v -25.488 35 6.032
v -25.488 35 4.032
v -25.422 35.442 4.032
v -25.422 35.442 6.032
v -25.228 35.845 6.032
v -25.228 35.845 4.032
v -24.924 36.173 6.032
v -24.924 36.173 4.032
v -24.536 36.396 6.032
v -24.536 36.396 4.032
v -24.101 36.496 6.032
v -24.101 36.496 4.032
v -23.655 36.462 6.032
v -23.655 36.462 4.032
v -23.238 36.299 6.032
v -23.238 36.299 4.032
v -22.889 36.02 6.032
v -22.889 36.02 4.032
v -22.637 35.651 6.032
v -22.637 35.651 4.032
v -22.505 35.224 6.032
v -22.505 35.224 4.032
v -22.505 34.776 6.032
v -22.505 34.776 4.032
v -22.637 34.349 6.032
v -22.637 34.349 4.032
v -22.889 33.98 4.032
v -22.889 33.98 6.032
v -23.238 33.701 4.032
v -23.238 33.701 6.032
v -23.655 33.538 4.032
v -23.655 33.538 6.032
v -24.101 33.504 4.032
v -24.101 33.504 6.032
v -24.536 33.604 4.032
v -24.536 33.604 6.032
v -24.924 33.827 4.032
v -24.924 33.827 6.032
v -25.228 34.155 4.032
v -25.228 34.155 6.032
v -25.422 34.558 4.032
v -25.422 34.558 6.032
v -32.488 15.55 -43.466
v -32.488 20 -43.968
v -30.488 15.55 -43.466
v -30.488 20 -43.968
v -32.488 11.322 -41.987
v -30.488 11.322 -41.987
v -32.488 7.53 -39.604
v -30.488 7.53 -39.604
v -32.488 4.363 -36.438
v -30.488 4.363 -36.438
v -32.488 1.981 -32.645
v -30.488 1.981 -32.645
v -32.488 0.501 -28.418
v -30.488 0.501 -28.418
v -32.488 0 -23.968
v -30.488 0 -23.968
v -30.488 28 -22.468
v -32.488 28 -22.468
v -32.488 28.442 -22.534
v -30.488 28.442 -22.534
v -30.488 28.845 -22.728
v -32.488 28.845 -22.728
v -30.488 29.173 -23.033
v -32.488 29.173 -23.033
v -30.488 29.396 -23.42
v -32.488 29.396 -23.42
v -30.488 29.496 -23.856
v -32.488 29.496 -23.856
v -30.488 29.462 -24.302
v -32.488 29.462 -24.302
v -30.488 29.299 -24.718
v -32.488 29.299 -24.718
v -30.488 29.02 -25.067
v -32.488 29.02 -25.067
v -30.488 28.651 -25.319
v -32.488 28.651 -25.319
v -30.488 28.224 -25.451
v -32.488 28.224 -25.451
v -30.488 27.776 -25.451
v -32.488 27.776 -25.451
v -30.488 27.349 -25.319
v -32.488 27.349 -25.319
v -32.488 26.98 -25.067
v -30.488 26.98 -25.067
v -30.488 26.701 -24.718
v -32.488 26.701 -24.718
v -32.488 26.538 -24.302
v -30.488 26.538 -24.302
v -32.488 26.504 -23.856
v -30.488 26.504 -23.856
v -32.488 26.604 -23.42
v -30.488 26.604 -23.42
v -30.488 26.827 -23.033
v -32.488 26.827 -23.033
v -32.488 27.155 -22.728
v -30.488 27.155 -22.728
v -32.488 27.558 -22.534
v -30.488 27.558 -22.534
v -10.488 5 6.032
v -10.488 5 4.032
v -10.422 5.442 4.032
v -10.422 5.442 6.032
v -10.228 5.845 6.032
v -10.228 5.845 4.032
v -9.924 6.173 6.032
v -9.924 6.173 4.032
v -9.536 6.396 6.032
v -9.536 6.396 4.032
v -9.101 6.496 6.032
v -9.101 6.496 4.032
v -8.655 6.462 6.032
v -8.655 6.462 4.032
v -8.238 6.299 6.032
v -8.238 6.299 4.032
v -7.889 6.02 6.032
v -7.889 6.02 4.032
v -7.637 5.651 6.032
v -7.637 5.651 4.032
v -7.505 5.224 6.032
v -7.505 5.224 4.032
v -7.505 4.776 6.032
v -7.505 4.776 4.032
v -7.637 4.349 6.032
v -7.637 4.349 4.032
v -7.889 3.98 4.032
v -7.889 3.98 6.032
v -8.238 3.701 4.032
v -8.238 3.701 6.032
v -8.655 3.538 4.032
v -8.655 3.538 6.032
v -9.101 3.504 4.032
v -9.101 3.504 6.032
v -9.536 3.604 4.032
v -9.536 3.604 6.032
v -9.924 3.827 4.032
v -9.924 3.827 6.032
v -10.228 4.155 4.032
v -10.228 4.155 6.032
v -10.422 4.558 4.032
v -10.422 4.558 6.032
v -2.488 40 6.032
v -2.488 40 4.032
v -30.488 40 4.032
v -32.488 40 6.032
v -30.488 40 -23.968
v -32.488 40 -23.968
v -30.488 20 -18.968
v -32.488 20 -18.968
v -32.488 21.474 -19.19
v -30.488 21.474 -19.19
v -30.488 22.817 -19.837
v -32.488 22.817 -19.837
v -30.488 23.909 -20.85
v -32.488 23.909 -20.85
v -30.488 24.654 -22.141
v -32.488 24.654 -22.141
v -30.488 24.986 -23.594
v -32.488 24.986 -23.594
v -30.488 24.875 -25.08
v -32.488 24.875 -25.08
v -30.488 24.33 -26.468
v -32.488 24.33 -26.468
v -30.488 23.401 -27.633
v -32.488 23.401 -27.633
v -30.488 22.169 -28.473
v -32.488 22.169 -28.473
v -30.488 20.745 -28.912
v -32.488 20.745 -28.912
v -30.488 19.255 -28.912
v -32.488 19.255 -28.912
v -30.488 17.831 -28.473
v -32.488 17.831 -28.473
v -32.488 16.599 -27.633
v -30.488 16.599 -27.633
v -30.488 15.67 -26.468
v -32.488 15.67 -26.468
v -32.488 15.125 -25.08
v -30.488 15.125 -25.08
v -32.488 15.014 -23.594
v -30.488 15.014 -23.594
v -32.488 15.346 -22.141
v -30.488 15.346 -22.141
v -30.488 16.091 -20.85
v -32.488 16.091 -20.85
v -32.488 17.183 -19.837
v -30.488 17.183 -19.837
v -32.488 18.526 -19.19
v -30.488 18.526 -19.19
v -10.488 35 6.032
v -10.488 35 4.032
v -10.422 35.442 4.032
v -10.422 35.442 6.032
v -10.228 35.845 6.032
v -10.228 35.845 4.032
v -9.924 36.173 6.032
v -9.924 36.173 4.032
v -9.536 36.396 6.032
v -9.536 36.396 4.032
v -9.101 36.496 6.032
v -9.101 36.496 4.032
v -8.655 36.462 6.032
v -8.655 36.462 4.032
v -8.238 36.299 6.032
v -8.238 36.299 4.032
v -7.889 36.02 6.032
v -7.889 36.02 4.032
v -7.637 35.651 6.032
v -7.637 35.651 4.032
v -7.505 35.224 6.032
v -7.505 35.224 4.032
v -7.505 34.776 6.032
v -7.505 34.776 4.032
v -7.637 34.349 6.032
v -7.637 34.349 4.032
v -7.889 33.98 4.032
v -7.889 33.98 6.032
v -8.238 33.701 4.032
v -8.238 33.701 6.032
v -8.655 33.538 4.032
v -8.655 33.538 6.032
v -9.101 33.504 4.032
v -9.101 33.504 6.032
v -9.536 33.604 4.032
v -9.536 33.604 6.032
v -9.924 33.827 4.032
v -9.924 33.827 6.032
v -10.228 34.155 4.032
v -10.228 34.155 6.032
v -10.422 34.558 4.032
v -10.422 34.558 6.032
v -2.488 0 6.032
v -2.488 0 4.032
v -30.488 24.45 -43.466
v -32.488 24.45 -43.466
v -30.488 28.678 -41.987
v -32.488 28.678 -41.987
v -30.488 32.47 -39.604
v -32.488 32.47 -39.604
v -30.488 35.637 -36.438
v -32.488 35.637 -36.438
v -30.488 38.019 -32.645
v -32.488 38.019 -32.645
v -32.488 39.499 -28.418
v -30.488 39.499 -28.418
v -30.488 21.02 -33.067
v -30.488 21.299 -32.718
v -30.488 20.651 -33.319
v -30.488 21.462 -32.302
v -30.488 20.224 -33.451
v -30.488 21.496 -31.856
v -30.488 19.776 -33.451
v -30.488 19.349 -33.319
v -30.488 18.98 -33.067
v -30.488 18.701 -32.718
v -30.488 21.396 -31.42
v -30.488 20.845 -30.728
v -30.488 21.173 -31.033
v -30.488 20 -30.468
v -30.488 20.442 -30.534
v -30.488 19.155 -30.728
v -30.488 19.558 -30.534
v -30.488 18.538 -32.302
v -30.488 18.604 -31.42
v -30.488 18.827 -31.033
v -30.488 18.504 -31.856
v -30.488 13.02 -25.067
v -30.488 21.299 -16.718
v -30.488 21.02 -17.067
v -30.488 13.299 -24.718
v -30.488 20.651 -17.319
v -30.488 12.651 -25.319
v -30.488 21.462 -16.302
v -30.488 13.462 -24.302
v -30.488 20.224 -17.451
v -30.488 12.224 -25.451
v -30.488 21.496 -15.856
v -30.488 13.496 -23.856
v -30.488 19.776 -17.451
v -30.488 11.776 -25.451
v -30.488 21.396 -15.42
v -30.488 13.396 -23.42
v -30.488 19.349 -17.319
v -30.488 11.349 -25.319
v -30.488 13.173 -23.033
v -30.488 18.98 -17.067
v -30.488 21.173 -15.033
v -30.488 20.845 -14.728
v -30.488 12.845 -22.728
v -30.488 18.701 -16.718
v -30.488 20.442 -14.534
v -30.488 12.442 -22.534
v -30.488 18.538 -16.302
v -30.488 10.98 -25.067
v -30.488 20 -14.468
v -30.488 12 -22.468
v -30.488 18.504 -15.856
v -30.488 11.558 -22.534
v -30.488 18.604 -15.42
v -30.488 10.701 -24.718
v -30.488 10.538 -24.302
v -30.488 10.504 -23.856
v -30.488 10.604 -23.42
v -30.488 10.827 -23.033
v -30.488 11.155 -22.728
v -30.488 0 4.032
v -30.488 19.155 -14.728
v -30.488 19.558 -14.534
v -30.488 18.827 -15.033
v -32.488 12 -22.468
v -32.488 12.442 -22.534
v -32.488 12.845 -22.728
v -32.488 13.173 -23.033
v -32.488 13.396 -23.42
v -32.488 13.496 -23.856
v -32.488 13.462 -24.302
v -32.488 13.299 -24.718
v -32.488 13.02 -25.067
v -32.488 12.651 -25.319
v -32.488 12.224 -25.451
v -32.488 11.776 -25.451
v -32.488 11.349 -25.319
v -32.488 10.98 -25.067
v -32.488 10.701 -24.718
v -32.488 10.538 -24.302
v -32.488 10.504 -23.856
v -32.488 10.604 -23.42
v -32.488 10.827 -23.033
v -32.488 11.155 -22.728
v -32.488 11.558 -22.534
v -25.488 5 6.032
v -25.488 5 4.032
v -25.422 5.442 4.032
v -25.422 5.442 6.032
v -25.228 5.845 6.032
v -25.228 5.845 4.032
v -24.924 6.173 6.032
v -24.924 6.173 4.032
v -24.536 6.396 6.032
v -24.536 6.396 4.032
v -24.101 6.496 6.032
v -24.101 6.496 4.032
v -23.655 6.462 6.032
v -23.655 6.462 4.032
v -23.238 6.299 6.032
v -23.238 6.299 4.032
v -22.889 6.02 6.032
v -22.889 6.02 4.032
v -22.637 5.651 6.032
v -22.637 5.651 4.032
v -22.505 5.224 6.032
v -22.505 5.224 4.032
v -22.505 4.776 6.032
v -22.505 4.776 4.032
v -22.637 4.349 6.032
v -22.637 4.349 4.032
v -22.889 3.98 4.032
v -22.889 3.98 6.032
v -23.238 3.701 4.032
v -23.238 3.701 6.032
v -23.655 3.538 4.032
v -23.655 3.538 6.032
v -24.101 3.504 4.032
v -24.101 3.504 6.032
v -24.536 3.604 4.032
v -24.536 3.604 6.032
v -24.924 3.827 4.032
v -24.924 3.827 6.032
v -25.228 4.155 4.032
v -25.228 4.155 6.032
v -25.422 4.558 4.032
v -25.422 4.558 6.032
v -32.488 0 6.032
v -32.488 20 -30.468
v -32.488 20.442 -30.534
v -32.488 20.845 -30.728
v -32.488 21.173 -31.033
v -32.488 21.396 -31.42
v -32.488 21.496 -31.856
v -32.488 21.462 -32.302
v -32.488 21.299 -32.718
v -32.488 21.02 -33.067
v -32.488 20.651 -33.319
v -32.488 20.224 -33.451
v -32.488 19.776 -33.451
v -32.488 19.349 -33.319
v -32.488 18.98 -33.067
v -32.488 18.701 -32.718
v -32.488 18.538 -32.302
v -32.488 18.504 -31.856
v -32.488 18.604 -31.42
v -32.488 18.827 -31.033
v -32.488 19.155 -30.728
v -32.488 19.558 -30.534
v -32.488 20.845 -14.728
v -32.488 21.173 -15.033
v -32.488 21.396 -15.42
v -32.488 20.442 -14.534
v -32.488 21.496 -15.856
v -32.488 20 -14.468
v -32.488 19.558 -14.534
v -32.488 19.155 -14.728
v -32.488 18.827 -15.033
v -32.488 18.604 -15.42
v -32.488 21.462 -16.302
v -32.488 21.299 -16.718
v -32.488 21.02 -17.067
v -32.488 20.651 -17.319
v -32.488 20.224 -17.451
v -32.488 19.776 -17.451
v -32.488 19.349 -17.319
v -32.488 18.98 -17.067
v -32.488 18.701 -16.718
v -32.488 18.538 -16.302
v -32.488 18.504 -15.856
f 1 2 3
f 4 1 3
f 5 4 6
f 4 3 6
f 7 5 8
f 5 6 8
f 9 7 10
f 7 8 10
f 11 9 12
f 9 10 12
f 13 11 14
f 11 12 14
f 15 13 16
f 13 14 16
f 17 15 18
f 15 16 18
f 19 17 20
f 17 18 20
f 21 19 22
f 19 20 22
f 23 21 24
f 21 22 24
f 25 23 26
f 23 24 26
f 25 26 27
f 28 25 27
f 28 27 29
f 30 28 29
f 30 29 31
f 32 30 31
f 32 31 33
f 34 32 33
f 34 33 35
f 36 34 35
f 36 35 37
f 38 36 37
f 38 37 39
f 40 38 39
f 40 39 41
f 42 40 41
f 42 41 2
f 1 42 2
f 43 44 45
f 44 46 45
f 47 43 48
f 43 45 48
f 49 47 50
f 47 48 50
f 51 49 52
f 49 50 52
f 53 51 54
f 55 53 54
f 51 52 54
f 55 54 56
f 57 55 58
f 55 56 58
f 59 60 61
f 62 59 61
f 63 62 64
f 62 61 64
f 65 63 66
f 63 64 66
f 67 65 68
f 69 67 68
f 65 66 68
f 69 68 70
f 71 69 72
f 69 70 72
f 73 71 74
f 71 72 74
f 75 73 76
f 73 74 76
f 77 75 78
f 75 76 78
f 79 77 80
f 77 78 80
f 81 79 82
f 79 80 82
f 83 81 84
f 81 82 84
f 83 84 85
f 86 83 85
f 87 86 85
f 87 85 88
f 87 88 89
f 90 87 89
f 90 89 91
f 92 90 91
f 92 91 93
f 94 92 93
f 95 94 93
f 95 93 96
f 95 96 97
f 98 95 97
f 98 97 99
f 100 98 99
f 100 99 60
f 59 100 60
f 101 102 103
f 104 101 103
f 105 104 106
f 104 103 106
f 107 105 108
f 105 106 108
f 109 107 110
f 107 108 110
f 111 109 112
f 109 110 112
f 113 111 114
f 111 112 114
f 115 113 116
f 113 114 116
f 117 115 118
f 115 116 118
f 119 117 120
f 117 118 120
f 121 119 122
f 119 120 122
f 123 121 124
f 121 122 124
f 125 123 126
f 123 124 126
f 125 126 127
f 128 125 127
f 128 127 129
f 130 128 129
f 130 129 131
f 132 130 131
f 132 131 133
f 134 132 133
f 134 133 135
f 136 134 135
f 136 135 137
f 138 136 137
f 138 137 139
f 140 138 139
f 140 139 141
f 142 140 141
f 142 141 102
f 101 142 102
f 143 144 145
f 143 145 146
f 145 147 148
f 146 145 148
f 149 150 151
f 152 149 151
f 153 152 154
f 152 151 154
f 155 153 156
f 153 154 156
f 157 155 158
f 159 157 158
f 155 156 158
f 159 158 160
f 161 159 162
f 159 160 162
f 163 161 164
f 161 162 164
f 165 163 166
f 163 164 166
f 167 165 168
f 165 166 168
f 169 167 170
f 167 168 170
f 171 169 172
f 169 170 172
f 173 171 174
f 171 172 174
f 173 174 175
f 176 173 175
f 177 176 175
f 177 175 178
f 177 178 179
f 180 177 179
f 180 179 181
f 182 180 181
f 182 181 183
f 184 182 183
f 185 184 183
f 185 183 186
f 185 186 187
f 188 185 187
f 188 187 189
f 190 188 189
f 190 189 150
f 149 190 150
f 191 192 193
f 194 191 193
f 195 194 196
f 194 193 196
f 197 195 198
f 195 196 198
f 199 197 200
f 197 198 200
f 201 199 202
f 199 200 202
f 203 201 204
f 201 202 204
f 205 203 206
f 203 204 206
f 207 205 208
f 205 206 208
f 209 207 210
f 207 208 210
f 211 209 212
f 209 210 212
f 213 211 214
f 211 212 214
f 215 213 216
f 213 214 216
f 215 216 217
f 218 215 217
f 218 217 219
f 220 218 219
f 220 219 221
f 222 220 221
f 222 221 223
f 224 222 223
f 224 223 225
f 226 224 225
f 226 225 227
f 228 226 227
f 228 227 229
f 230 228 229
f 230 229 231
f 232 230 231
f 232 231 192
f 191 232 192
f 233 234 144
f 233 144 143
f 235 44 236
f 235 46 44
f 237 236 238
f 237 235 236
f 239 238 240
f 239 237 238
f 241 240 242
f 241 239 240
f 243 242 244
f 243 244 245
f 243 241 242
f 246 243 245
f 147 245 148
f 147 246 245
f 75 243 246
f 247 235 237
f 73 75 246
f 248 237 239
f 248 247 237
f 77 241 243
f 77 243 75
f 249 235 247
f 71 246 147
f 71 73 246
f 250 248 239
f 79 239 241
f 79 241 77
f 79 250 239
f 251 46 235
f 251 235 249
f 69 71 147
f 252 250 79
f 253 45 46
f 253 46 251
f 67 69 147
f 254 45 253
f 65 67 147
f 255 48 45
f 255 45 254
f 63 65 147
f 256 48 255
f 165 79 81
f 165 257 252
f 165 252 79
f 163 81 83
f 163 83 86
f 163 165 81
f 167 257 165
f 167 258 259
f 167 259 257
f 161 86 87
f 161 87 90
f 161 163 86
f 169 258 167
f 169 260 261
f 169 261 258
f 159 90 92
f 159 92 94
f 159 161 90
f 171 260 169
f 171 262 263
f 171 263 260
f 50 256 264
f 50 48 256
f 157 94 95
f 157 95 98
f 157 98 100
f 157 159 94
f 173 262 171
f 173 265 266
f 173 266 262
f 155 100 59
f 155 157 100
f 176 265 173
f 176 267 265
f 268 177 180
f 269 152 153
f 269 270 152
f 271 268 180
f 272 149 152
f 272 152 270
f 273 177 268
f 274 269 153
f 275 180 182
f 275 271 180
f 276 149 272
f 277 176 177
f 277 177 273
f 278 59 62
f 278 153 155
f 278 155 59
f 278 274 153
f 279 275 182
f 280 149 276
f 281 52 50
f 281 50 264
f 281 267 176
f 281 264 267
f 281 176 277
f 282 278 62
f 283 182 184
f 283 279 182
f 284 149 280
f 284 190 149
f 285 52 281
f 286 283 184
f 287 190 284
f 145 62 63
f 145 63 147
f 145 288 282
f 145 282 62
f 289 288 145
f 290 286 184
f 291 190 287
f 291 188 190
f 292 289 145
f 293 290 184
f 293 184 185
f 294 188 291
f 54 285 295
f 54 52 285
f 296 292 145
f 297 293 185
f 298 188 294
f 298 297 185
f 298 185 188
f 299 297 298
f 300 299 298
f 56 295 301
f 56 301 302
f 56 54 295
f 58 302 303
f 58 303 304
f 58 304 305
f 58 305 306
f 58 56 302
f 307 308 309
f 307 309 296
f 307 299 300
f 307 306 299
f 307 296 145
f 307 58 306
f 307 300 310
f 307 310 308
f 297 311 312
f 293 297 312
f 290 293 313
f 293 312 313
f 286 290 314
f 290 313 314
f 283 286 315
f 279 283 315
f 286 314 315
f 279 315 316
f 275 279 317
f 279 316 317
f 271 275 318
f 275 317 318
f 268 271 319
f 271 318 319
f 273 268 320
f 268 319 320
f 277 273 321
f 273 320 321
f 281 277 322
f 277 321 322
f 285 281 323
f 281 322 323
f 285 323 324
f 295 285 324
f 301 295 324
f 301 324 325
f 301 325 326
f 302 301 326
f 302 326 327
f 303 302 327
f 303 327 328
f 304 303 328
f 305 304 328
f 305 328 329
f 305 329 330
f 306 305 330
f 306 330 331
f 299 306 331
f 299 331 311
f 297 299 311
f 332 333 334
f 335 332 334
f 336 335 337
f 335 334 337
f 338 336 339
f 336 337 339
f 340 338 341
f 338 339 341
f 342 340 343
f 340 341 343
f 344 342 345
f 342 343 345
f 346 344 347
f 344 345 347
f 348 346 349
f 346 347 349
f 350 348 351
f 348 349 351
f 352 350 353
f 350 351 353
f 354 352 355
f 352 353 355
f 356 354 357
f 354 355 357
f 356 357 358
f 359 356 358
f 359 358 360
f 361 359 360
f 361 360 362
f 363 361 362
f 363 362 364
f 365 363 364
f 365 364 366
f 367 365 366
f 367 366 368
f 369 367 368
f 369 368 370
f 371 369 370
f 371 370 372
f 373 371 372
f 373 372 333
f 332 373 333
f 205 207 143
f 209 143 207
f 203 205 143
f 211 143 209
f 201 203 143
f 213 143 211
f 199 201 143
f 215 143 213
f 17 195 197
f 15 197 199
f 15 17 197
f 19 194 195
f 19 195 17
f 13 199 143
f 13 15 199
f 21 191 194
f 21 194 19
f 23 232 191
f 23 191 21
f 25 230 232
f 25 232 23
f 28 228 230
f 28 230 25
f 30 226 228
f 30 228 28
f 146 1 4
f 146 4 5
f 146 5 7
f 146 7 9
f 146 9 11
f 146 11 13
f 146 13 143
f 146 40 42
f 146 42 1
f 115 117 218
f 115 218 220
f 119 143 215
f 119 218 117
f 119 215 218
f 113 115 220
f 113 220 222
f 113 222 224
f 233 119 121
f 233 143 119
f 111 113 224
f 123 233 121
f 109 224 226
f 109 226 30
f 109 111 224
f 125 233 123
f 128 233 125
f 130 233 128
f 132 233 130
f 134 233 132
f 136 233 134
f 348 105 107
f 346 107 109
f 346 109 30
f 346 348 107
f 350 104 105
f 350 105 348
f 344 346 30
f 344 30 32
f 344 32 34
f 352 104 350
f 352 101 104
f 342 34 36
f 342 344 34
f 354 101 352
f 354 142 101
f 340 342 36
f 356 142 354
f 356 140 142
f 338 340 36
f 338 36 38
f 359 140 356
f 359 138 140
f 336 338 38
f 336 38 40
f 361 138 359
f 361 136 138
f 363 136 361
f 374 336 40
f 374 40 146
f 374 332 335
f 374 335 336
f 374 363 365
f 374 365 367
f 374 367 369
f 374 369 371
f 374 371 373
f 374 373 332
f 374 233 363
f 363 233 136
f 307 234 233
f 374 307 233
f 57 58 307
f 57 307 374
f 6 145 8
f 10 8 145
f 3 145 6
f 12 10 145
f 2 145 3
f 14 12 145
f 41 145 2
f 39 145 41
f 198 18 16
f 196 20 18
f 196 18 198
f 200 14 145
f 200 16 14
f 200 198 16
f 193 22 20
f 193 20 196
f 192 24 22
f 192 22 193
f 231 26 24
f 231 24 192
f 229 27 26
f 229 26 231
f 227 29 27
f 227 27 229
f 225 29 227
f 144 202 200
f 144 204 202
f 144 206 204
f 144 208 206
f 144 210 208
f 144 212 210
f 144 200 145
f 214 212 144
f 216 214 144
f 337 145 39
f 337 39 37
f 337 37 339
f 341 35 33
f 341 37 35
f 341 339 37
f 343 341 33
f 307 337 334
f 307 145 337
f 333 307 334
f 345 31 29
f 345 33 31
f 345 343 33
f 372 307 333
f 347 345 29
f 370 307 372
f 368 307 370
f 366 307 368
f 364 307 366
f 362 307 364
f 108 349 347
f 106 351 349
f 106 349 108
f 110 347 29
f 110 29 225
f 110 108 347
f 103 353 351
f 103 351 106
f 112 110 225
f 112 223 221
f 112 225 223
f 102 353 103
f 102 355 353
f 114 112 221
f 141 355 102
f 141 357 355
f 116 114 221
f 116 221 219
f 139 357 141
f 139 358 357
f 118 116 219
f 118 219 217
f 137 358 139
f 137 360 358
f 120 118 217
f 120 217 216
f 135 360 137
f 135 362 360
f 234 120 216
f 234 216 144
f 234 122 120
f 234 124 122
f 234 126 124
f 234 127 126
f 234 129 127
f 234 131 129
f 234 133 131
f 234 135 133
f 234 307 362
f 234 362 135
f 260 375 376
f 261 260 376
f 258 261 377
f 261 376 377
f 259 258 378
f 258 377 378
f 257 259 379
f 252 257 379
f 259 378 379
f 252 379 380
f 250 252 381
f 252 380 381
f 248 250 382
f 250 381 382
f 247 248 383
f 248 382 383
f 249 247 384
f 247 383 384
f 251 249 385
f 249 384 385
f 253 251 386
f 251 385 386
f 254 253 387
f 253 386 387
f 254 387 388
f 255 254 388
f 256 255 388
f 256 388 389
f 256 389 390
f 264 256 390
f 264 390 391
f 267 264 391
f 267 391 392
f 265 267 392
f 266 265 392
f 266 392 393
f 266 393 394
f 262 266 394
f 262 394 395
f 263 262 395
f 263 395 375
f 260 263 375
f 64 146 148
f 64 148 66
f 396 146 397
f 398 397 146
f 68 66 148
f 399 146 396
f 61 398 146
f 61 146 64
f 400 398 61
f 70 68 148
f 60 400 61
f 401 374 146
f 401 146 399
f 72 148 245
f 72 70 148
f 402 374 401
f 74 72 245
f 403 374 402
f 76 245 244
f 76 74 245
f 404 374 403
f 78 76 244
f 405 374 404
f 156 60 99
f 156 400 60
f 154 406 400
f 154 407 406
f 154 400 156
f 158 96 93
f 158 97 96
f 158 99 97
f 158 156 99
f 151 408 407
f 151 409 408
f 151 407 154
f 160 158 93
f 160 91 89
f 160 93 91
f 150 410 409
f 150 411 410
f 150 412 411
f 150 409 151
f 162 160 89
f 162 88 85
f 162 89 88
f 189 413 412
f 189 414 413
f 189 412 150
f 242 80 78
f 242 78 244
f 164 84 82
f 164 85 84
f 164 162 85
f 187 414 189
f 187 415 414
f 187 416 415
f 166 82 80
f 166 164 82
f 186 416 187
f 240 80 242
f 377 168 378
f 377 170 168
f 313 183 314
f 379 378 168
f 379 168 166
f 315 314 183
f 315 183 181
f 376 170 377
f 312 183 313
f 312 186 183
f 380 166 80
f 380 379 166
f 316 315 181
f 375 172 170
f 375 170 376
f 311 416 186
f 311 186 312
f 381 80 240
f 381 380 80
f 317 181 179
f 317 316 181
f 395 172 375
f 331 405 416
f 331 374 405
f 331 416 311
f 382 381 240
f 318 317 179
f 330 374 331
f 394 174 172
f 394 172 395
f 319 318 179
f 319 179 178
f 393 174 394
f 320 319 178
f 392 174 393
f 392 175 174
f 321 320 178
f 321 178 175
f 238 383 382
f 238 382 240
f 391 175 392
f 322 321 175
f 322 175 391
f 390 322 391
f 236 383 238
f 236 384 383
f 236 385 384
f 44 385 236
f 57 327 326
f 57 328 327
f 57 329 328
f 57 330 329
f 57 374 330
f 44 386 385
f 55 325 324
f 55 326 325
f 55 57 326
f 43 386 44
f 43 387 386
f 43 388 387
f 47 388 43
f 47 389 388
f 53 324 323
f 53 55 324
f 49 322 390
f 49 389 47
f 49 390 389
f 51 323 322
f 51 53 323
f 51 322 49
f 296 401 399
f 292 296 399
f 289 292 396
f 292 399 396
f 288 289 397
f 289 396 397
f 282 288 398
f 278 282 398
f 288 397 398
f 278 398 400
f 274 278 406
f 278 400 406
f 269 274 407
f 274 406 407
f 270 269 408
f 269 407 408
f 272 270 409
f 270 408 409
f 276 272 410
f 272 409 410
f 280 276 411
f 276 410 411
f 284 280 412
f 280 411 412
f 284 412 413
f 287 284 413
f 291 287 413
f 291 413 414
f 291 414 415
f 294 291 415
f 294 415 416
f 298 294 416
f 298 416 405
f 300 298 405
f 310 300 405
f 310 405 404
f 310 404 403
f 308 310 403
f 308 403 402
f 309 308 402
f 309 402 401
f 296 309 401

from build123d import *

# Parameters (mm, degrees)
EXTRUDE_1_DEPTH     = 40
FILLET_1_R          = 20
SKETCH_3_R          = 5
CUT_EXTRUDE_1_DEPTH = 10
SKETCH_15_R         = 1.5
CUT_EXTRUDE_2_DEPTH = 10
SKETCH_18_R         = 1.5
CUT_EXTRUDE_5_DEPTH = 10


with BuildPart() as part:
    # 草图1 → 凸台-拉伸1 (new body)
    with BuildSketch(Plane(origin=(0, 0, 0), x_dir=(1, 0, 0), z_dir=(0, 1, 0))):
        Polygon((-2.488479263, -6.032258065), (-32.488479263, -6.032258065), (-32.488479263, 43.967741935), (-30.488479263, 43.967741935), (-30.488479263, -4.032258065), (-2.488479263, -4.032258065), align=None)
    extrude(amount=EXTRUDE_1_DEPTH)

    # 圆角1
    fillet_1_edges = [part.edges().sort_by_distance(p)[0] for p in [
        (-31.488479263, 40, -43.967741935),
        (-31.488479263, 0, -43.967741935),
    ]]
    fillet(fillet_1_edges, radius=FILLET_1_R - 0.0001)  # a hair under: the kernel refuses the full size

    # 草图3 → 切除-拉伸1 (cut)
    with BuildSketch(Plane.ZY.offset(32.488479263)):
        with Locations((-23.967741935, 20)):
            Circle(SKETCH_3_R)
    extrude(amount=-CUT_EXTRUDE_1_DEPTH, mode=Mode.SUBTRACT)

    # 草图15 → 切除-拉伸2 (cut)
    with BuildSketch(Plane(origin=(-32.488479263, 20.448882386, -1043.967741935), x_dir=(0, 0, 1), z_dir=(-1, 0, 0))):
        with Locations((1012, -0.448882386)):
            Circle(SKETCH_15_R)
        with Locations((1020, 7.551117614)):
            Circle(SKETCH_15_R)
        with Locations((1028, -0.448882386)):
            Circle(SKETCH_15_R)
        with Locations((1020, -8.448882386)):
            Circle(SKETCH_15_R)
    extrude(amount=-CUT_EXTRUDE_2_DEPTH, mode=Mode.SUBTRACT)

    # 草图18 → 切除-拉伸5 (cut)
    with BuildSketch(Plane(origin=(0, 0, 4.032258065), x_dir=(-1, 0, 0), z_dir=(0, 0, -1))):
        with Locations((8.988479263, 35)):
            Circle(SKETCH_18_R)
        with Locations((23.988479263, 35)):
            Circle(SKETCH_18_R)
        with Locations((23.988479263, 5)):
            Circle(SKETCH_18_R)
        with Locations((8.988479263, 5)):
            Circle(SKETCH_18_R)
    extrude(amount=-CUT_EXTRUDE_5_DEPTH, mode=Mode.SUBTRACT)


solid = part.part
